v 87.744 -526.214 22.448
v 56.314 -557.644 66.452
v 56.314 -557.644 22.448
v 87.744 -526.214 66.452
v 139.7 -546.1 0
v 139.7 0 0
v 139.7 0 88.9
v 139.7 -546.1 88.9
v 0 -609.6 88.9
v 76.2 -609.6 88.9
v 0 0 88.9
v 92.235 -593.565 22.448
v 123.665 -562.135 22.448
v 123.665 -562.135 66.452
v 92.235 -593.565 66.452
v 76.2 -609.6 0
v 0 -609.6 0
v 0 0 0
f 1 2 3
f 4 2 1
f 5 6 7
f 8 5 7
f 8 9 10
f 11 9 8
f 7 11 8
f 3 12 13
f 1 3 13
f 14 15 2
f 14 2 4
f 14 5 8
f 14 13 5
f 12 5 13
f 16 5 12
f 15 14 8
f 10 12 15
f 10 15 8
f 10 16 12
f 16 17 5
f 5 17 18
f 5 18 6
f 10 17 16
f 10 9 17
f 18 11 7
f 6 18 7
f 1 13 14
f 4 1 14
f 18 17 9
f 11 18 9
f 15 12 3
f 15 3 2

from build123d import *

# Parameters (mm, degrees)
F0_W     = 139.7
F0_H     = 88.9
F1_DEPTH = 609.6
F2_SIZE  = 63.5
F3_W     = 44.45
F3_H     = 44.003254
F4_DEPTH = 50.8


with BuildPart() as f1:
    # F0 (on Front) → F1 (new body)
    with BuildSketch(Plane.XZ):
        with Locations((69.85, 44.45)):
            Rectangle(F0_W, F0_H)
    extrude(amount=F1_DEPTH)

    # F2
    f2_edges = [f1.edges().sort_by_distance(p)[0] for p in [
        (139.7, -609.6, 44.45),
    ]]
    chamfer(f2_edges, length=F2_SIZE)

    # F3 (on face) → F4 (cut)
    with BuildSketch(Plane(origin=(342.9, -342.9, 0), x_dir=(0.707107, 0.707107, 0), z_dir=(0.707107, -0.707107, 0))):
        with Locations((-332.269476, 44.45)):
            Rectangle(F3_W, F3_H)
    extrude(amount=-F4_DEPTH, mode=Mode.SUBTRACT)


solid = f1.part
